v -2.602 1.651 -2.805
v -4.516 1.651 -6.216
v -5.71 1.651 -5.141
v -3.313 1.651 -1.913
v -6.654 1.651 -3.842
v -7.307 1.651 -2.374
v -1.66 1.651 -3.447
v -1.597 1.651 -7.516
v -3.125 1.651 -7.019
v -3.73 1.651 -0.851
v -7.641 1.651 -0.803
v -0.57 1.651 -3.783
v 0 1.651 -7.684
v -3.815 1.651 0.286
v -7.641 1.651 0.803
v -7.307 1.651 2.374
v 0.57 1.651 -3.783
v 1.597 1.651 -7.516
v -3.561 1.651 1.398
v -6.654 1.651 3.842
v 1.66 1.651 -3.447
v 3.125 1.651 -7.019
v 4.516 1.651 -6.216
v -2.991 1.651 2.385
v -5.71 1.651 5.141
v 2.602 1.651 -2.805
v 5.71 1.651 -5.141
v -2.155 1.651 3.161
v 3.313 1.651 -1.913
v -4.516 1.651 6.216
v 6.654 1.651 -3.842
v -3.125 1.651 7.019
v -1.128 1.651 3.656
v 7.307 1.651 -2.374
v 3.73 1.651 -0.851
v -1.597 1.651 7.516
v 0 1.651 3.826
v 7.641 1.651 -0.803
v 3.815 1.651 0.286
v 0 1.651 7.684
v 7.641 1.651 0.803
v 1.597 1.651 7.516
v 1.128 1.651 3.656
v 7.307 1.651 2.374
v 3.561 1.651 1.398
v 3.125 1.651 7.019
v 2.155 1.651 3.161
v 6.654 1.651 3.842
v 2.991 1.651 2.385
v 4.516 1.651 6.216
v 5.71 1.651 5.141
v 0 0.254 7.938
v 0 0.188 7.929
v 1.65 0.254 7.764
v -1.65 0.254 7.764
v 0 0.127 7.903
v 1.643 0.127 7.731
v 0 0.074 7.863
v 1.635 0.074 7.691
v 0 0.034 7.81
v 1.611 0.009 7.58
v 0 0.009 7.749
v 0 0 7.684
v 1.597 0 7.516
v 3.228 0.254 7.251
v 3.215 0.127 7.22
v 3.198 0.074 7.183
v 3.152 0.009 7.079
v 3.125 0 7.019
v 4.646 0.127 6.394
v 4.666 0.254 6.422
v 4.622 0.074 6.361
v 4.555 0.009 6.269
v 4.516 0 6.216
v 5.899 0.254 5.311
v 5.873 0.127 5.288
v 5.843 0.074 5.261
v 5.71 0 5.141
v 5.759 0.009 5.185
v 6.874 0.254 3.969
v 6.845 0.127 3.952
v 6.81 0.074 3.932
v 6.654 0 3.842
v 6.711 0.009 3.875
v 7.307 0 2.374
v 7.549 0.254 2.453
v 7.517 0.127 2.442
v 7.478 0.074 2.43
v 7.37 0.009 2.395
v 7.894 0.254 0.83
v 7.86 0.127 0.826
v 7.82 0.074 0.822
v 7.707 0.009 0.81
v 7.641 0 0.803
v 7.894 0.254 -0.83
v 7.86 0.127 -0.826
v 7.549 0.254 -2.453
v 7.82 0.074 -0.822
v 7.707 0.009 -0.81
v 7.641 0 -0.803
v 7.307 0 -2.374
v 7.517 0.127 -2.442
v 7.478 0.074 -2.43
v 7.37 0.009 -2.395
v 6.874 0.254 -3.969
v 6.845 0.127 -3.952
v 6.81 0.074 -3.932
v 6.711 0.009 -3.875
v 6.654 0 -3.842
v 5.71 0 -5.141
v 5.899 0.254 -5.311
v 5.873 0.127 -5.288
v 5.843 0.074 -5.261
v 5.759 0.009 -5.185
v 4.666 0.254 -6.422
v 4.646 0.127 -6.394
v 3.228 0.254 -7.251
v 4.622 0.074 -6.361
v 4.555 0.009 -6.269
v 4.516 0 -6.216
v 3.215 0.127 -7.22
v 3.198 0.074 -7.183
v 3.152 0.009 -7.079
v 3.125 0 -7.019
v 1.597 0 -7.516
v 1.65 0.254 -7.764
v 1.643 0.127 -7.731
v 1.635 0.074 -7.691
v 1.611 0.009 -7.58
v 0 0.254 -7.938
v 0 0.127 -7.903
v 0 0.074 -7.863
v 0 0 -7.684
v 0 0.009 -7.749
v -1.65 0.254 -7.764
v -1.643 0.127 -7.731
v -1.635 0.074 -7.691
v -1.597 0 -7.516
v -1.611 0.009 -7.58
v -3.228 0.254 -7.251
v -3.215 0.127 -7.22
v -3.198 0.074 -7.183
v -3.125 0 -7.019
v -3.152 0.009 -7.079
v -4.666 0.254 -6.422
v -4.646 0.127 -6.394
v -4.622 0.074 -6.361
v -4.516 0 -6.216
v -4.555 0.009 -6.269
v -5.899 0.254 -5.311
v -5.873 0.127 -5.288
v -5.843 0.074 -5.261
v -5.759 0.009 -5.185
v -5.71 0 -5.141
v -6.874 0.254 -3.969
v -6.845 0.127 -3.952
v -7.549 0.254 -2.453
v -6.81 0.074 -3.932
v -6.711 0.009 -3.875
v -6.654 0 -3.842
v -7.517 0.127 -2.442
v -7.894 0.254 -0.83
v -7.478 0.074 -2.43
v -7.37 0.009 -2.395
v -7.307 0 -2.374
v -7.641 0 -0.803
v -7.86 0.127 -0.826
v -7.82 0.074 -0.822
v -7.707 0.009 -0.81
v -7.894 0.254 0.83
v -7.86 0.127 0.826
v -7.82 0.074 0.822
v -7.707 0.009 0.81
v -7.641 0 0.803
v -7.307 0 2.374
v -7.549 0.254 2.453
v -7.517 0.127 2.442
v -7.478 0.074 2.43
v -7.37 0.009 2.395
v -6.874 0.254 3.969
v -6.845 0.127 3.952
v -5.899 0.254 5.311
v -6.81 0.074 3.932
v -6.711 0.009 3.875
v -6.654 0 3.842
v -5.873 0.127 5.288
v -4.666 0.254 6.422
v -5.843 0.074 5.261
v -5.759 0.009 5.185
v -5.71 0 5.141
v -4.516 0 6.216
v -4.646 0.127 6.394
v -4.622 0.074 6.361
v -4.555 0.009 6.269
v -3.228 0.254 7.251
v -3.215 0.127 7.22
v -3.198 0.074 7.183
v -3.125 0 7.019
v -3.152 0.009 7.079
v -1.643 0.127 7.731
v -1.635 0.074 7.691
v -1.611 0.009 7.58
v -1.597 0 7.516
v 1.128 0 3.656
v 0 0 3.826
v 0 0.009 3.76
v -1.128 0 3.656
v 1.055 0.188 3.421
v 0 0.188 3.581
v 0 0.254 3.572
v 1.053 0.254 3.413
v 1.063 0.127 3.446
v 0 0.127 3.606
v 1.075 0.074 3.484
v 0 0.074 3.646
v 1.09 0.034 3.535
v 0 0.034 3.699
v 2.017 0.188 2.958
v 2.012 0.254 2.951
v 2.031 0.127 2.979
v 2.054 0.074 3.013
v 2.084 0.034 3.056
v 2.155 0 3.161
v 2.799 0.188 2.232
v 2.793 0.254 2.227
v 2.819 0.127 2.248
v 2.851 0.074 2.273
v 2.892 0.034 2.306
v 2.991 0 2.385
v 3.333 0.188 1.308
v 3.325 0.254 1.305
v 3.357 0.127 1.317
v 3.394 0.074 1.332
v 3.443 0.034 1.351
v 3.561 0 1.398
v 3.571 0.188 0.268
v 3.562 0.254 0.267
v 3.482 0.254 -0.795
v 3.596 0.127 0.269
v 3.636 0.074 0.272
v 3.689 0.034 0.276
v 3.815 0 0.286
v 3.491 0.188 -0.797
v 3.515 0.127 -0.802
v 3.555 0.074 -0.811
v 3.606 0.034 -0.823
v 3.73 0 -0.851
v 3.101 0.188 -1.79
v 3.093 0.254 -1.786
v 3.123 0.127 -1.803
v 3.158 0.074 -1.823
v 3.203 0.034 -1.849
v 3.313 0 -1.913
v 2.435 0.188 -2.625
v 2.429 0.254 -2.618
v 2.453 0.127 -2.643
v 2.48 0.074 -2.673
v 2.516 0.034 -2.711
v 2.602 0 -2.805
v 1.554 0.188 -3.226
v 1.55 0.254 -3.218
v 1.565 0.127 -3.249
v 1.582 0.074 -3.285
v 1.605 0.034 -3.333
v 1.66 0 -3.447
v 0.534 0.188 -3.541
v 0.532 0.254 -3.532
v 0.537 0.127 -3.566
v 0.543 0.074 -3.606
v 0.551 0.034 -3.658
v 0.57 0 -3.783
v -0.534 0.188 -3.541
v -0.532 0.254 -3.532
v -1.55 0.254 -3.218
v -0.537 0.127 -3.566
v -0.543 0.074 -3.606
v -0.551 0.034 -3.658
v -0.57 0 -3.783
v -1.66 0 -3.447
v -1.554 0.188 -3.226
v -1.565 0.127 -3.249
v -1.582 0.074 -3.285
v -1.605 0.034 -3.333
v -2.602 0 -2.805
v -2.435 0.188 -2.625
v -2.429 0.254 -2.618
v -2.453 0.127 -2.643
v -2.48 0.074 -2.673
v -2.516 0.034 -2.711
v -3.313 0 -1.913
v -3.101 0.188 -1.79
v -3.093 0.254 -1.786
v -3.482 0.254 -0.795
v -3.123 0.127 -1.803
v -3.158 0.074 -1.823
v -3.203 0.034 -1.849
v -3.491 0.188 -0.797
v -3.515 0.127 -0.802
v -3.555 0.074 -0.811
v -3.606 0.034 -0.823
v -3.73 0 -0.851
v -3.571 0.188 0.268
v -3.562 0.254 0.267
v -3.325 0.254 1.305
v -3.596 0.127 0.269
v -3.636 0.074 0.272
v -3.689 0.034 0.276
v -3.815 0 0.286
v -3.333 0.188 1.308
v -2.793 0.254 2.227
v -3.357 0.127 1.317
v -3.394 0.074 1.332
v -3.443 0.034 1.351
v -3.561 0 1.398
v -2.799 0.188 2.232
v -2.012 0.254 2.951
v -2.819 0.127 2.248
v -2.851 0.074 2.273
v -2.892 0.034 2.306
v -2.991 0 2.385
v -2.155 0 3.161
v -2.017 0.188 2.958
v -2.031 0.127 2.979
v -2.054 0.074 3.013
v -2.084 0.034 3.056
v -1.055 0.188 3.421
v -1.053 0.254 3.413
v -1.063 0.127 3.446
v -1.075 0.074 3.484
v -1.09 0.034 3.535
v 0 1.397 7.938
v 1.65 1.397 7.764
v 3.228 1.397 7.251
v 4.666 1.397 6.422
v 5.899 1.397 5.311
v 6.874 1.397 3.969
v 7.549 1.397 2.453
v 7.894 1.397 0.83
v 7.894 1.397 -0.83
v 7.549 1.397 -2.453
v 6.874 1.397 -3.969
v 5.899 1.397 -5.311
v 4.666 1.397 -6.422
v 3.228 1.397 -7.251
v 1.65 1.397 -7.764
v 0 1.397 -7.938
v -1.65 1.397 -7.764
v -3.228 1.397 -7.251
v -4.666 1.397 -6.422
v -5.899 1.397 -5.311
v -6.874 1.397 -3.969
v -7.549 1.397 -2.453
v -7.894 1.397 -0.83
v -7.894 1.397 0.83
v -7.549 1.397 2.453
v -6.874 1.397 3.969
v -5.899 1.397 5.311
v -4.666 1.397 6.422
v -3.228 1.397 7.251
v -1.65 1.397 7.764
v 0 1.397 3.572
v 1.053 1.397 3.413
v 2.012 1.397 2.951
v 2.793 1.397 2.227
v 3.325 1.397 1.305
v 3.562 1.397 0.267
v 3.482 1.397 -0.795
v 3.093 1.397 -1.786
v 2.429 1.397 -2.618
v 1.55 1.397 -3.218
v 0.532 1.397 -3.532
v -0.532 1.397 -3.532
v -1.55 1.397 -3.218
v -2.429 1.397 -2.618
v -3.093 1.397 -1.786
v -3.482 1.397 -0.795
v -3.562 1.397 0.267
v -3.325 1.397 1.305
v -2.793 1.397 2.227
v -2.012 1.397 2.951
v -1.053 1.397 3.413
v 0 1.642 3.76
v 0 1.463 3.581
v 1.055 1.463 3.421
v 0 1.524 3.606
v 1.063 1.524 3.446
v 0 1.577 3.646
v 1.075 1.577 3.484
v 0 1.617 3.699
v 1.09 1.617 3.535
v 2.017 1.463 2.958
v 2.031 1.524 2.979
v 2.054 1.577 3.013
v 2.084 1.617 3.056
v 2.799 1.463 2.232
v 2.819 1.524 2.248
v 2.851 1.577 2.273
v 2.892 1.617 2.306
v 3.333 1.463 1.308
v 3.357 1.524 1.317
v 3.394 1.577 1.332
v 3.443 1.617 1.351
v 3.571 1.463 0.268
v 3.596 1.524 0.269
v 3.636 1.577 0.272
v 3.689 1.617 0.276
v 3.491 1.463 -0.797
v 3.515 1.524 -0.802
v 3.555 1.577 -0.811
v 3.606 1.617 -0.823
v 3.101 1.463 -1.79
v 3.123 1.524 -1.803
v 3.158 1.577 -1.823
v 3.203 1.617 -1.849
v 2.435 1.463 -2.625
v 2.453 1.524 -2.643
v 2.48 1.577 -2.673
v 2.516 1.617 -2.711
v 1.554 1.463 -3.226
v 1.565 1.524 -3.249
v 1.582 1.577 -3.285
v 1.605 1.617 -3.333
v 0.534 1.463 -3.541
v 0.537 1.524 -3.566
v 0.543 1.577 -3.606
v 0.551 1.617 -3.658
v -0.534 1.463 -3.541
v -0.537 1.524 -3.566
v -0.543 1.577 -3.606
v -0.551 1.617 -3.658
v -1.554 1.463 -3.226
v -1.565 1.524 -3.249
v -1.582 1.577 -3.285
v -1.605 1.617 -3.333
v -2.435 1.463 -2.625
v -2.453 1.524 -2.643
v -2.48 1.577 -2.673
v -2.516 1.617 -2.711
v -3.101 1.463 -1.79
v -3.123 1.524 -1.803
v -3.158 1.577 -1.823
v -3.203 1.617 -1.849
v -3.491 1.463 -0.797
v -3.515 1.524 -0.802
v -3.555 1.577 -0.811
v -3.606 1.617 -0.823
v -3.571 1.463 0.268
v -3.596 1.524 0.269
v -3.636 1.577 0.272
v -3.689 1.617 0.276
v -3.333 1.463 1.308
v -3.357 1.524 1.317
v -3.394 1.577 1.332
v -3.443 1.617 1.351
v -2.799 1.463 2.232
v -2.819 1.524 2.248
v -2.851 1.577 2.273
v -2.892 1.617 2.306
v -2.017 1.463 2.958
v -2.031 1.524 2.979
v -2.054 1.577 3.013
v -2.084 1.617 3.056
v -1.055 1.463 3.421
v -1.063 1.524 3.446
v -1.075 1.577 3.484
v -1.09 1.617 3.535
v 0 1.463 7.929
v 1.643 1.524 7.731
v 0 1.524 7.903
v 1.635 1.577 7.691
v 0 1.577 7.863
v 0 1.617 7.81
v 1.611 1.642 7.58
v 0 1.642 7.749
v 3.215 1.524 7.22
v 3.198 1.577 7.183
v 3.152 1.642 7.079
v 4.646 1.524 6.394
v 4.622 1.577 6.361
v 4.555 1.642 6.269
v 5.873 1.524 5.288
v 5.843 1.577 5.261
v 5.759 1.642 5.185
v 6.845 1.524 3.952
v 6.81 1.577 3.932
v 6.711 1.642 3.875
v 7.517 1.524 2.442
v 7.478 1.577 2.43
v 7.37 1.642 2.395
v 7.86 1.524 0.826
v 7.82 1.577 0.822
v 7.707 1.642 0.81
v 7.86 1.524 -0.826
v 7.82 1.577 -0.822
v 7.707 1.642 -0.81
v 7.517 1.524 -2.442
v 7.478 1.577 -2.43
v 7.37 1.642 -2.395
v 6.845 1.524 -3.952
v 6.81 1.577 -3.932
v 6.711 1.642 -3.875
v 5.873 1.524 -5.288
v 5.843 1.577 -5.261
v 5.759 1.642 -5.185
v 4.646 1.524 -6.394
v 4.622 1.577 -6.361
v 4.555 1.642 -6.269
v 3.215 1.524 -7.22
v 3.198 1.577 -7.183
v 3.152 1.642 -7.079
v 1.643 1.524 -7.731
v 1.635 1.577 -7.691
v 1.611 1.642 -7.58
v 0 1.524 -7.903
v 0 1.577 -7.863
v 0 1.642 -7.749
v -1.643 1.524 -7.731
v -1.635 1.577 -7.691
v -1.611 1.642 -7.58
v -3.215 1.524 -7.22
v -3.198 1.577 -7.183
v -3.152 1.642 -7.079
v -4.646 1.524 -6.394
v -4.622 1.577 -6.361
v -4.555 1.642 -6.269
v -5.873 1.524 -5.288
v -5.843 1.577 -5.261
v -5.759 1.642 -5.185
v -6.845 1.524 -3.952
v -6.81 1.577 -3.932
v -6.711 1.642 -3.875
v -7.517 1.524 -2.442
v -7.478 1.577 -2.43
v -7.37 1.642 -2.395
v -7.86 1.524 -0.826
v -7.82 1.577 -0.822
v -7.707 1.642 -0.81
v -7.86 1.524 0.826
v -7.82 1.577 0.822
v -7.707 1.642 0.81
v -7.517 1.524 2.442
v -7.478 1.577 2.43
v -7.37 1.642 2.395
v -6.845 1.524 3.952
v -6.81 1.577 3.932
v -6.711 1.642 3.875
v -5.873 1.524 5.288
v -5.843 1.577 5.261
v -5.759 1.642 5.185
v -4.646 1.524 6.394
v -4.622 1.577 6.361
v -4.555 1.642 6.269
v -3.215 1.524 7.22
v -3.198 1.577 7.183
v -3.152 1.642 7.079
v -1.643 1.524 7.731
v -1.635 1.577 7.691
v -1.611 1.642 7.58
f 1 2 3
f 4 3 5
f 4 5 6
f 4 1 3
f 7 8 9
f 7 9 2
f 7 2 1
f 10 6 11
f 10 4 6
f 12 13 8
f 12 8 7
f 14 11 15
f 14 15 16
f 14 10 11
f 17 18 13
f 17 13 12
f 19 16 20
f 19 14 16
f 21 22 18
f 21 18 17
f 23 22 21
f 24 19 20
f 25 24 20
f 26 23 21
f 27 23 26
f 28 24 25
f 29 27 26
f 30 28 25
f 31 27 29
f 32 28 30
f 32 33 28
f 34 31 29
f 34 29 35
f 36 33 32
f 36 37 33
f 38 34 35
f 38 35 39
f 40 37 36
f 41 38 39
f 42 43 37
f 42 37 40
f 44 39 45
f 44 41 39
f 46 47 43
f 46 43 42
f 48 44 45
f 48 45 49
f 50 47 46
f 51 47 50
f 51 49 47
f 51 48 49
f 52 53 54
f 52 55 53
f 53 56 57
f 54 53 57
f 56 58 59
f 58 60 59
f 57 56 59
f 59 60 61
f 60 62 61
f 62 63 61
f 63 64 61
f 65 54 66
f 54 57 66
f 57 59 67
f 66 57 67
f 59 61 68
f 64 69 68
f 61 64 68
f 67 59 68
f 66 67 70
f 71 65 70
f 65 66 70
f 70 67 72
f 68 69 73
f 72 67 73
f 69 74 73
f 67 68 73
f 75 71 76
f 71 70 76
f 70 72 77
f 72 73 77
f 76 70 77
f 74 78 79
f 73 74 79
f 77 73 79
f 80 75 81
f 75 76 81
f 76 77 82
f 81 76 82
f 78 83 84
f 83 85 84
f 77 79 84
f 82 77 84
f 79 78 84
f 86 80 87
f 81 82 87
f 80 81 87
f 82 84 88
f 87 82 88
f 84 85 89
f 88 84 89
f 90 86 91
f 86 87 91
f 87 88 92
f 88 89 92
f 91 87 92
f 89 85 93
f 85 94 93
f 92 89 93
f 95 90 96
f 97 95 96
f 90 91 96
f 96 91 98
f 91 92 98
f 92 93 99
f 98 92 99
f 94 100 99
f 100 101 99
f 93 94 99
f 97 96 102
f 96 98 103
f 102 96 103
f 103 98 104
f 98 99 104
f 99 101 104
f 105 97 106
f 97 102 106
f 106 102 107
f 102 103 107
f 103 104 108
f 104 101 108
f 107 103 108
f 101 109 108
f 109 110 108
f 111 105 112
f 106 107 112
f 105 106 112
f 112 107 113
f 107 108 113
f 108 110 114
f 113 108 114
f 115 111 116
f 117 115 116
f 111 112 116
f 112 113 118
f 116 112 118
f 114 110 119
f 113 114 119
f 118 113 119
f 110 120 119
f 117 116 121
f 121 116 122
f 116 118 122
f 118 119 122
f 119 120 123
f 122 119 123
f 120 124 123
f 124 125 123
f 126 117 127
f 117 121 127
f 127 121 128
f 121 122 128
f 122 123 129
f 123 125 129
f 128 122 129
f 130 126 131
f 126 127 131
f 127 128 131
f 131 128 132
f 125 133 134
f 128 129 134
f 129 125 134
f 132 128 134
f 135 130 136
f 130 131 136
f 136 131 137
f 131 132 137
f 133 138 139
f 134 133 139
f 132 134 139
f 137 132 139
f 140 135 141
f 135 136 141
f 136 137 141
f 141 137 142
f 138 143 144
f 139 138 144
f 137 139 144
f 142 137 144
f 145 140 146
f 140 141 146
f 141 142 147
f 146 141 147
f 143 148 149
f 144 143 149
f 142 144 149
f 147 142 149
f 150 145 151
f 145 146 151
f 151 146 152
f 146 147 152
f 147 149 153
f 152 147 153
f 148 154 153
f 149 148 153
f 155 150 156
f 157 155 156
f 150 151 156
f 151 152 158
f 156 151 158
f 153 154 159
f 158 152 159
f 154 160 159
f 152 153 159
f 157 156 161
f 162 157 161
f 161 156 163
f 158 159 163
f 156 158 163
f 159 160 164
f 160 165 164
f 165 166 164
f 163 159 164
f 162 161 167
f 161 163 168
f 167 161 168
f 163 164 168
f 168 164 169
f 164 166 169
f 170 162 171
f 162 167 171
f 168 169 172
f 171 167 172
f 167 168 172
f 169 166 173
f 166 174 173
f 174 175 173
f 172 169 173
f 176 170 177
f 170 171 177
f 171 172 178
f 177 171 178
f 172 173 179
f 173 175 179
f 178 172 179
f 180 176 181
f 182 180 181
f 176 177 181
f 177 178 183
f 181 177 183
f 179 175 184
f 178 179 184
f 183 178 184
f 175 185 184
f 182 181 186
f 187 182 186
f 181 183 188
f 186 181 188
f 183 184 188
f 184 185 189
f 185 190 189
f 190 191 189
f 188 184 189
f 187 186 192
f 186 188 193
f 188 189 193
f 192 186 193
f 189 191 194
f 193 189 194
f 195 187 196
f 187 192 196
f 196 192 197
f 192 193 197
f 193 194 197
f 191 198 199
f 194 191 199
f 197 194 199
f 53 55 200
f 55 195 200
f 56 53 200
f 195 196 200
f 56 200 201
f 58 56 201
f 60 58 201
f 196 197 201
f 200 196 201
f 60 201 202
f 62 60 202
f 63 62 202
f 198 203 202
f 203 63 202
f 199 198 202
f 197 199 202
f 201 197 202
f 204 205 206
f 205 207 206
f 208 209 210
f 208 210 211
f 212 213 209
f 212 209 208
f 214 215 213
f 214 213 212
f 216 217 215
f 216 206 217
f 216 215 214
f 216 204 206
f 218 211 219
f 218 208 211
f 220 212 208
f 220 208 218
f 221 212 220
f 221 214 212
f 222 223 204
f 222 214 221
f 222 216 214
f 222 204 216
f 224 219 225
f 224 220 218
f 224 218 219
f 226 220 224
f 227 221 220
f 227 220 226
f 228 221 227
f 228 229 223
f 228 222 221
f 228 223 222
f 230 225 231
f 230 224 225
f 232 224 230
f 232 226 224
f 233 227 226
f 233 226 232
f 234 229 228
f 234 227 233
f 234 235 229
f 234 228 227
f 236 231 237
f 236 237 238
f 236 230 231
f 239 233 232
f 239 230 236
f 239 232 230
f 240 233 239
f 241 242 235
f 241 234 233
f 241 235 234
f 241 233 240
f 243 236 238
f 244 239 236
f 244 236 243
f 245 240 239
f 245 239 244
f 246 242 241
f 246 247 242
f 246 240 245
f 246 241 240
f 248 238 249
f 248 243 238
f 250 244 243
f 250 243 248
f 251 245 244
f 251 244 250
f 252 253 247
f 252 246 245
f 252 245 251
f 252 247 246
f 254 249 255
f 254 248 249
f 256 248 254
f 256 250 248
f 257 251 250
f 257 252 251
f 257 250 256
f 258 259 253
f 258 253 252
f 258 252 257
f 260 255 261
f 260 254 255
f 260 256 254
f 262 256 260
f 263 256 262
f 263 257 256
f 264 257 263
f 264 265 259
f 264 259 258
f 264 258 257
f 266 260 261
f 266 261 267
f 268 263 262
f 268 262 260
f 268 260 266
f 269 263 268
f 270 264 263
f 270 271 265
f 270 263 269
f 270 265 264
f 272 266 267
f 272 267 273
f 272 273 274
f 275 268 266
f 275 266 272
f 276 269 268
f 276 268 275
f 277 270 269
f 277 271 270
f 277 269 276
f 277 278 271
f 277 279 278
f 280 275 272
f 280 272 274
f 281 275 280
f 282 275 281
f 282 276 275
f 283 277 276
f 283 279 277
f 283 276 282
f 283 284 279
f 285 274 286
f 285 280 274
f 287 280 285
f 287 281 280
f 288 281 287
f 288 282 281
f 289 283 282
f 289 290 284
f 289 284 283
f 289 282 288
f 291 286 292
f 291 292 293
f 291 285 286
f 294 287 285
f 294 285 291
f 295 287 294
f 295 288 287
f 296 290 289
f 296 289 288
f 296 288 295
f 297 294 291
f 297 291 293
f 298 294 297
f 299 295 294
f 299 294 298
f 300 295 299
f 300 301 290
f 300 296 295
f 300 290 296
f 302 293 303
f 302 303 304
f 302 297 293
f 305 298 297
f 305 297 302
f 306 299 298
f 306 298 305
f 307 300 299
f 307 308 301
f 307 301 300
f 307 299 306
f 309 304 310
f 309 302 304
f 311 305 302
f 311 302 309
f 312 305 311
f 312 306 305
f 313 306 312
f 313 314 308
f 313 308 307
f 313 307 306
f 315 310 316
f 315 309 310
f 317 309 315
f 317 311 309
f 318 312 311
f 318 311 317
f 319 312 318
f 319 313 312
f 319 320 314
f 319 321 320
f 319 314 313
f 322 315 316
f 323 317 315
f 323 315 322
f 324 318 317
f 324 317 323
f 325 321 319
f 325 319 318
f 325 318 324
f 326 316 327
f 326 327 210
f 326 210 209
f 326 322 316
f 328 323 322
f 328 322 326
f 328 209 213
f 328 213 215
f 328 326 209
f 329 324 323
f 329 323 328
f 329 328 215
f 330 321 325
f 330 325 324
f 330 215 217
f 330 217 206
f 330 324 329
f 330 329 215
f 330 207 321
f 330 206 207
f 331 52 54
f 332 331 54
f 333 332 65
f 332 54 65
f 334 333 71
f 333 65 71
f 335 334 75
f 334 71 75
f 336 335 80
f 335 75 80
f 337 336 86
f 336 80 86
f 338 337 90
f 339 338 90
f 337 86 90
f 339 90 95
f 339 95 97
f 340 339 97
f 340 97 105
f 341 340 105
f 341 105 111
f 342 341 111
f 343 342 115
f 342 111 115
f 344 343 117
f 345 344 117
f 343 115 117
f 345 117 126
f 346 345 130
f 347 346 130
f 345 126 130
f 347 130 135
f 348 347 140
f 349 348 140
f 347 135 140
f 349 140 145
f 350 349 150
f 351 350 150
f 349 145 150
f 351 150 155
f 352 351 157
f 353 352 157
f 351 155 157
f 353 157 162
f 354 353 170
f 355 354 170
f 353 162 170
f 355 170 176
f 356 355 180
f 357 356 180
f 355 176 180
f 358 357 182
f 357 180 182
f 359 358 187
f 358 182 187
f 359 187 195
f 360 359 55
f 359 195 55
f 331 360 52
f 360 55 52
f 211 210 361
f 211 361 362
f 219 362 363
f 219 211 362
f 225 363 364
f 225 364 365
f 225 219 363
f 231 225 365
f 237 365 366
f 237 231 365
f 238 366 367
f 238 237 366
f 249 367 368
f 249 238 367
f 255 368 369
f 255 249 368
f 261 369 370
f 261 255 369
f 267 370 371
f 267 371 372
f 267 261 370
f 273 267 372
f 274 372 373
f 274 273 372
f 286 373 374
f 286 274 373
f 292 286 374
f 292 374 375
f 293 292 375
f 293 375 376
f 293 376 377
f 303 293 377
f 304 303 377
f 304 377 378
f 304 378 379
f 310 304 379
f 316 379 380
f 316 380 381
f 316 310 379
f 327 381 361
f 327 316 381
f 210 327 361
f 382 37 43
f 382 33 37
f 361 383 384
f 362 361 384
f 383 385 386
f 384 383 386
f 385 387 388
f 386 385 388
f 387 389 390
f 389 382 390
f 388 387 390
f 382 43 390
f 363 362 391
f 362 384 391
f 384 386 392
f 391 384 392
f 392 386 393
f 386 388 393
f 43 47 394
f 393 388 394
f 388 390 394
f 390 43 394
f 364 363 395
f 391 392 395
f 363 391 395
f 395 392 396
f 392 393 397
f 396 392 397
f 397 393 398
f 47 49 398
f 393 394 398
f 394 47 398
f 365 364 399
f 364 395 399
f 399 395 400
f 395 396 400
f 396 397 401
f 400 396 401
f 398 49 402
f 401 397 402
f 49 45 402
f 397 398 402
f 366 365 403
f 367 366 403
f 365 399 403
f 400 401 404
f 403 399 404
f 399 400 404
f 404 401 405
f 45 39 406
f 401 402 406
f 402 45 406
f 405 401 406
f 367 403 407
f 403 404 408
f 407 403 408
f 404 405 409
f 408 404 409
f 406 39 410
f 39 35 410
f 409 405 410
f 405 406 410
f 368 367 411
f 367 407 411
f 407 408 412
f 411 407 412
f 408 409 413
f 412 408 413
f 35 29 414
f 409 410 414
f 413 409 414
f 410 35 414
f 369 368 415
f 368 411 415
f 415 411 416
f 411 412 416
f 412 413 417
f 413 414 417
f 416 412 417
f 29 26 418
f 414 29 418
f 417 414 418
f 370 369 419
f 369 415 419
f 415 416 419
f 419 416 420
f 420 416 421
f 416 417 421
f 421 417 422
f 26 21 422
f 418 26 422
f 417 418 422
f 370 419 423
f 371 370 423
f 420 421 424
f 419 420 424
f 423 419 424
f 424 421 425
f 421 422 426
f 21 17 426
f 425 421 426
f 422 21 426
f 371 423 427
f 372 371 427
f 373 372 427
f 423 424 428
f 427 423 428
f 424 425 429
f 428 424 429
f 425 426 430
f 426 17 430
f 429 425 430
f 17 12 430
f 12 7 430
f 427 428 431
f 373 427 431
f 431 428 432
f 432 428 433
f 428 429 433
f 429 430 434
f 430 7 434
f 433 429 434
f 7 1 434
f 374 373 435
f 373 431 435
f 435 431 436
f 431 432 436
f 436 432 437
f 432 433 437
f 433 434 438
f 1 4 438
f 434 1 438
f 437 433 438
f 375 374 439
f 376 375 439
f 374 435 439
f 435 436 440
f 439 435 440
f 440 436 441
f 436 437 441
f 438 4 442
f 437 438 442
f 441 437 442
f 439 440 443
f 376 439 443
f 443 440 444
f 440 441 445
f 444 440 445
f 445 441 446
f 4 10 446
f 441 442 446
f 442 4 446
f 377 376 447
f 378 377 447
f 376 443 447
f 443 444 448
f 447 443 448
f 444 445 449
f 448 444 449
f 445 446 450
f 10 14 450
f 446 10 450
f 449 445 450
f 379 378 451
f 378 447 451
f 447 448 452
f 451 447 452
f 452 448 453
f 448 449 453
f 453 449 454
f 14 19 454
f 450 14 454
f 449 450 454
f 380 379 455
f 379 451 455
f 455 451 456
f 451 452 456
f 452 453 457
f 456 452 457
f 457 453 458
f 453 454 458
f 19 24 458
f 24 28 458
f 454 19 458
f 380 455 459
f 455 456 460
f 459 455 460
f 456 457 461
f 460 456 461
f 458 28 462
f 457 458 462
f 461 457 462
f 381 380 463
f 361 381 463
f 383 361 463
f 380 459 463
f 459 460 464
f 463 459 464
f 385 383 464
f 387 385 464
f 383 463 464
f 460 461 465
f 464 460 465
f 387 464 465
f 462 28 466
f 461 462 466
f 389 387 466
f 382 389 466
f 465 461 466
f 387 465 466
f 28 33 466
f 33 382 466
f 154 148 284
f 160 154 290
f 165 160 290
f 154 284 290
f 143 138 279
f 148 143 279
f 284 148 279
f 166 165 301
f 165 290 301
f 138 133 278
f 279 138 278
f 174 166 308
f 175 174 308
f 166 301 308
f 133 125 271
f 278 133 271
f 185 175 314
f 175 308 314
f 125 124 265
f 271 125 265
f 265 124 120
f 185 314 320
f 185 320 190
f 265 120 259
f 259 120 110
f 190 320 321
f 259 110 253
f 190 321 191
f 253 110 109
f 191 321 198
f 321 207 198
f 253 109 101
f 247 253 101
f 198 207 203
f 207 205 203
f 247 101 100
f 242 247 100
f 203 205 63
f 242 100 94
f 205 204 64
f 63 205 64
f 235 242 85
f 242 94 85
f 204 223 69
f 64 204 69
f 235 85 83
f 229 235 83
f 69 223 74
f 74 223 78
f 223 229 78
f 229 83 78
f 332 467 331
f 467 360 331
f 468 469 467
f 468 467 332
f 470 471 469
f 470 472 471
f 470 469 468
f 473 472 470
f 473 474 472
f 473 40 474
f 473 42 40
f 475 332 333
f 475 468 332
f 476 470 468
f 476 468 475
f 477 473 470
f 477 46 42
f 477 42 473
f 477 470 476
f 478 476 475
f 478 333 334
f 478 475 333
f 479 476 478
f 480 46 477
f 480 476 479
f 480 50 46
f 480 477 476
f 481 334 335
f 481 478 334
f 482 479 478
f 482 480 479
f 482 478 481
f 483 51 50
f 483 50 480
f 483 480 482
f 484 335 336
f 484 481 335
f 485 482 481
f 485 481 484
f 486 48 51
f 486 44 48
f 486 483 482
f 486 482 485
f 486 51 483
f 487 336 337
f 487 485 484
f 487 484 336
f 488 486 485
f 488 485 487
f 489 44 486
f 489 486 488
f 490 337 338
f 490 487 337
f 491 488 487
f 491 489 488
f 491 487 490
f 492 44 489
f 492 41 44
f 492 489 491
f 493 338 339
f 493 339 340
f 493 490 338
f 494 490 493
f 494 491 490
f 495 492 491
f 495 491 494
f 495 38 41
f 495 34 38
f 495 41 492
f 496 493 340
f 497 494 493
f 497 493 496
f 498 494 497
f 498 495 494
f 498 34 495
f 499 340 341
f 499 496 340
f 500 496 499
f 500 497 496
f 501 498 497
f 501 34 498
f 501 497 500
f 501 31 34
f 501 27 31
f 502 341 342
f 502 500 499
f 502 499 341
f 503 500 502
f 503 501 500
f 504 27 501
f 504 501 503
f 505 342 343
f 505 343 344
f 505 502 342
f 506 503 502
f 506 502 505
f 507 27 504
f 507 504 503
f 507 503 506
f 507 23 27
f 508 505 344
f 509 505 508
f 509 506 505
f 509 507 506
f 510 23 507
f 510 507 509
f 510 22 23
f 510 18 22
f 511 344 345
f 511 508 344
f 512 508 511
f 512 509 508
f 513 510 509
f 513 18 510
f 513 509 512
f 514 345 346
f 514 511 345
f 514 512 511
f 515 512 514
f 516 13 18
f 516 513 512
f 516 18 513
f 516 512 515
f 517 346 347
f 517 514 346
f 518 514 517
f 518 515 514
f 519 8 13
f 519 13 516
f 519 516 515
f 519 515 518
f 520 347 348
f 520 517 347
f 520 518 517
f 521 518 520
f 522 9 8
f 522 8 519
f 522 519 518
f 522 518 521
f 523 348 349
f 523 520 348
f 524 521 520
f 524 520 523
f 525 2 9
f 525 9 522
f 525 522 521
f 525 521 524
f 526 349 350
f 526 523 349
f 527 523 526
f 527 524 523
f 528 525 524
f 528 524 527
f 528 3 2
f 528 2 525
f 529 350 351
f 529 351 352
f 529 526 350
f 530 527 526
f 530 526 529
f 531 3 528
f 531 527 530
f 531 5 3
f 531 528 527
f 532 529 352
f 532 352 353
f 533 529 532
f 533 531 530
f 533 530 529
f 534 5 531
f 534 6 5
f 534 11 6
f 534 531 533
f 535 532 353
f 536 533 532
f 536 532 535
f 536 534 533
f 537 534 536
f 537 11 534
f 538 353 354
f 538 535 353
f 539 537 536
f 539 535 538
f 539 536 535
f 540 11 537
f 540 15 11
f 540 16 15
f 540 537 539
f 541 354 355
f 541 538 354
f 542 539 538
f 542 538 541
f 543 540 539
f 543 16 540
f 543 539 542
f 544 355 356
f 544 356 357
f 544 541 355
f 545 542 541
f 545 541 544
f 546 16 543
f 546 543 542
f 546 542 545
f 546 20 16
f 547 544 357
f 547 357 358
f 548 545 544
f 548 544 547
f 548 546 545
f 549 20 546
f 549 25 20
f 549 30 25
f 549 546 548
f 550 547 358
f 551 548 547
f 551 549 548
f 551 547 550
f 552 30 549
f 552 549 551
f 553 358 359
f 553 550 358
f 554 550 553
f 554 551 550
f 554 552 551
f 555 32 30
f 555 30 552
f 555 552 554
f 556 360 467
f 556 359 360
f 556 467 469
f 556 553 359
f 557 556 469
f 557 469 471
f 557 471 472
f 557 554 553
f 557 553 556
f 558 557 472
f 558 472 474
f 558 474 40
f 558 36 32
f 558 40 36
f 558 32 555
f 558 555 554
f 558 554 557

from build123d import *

# Parameters (mm, degrees)
SKETCH1_R      = 7.9375
SKETCH1_R_2    = 3.571875
EXTRUDE1_DEPTH = 1.651
FILLET1_R      = 0.254


with BuildPart() as part:
    # Sketch1 → Extrude1 (new body)
    with BuildSketch(Plane(origin=(0, 0, 0), x_dir=(1, 0, 0), z_dir=(0, 1, 0))):
        with Locations(Location((0, 0, 0), (0, 0, 270))):  # turned: the seam where the file's is
            Circle(SKETCH1_R)
        with Locations(Location((0, 0, 0), (0, 0, 270))):  # turned: the seam where the file's is
            Circle(SKETCH1_R_2, mode=Mode.SUBTRACT)
    extrude(amount=EXTRUDE1_DEPTH)

    # Fillet1
    fillet1_edges = [part.edges().sort_by_distance(p)[0] for p in [
        (0, 0, -7.9375),
        (0, 1.651, -7.9375),
        (0, 0, -3.571875),
        (0, 1.651, -3.571875),
    ]]
    fillet(fillet1_edges, radius=FILLET1_R)


solid = part.part
